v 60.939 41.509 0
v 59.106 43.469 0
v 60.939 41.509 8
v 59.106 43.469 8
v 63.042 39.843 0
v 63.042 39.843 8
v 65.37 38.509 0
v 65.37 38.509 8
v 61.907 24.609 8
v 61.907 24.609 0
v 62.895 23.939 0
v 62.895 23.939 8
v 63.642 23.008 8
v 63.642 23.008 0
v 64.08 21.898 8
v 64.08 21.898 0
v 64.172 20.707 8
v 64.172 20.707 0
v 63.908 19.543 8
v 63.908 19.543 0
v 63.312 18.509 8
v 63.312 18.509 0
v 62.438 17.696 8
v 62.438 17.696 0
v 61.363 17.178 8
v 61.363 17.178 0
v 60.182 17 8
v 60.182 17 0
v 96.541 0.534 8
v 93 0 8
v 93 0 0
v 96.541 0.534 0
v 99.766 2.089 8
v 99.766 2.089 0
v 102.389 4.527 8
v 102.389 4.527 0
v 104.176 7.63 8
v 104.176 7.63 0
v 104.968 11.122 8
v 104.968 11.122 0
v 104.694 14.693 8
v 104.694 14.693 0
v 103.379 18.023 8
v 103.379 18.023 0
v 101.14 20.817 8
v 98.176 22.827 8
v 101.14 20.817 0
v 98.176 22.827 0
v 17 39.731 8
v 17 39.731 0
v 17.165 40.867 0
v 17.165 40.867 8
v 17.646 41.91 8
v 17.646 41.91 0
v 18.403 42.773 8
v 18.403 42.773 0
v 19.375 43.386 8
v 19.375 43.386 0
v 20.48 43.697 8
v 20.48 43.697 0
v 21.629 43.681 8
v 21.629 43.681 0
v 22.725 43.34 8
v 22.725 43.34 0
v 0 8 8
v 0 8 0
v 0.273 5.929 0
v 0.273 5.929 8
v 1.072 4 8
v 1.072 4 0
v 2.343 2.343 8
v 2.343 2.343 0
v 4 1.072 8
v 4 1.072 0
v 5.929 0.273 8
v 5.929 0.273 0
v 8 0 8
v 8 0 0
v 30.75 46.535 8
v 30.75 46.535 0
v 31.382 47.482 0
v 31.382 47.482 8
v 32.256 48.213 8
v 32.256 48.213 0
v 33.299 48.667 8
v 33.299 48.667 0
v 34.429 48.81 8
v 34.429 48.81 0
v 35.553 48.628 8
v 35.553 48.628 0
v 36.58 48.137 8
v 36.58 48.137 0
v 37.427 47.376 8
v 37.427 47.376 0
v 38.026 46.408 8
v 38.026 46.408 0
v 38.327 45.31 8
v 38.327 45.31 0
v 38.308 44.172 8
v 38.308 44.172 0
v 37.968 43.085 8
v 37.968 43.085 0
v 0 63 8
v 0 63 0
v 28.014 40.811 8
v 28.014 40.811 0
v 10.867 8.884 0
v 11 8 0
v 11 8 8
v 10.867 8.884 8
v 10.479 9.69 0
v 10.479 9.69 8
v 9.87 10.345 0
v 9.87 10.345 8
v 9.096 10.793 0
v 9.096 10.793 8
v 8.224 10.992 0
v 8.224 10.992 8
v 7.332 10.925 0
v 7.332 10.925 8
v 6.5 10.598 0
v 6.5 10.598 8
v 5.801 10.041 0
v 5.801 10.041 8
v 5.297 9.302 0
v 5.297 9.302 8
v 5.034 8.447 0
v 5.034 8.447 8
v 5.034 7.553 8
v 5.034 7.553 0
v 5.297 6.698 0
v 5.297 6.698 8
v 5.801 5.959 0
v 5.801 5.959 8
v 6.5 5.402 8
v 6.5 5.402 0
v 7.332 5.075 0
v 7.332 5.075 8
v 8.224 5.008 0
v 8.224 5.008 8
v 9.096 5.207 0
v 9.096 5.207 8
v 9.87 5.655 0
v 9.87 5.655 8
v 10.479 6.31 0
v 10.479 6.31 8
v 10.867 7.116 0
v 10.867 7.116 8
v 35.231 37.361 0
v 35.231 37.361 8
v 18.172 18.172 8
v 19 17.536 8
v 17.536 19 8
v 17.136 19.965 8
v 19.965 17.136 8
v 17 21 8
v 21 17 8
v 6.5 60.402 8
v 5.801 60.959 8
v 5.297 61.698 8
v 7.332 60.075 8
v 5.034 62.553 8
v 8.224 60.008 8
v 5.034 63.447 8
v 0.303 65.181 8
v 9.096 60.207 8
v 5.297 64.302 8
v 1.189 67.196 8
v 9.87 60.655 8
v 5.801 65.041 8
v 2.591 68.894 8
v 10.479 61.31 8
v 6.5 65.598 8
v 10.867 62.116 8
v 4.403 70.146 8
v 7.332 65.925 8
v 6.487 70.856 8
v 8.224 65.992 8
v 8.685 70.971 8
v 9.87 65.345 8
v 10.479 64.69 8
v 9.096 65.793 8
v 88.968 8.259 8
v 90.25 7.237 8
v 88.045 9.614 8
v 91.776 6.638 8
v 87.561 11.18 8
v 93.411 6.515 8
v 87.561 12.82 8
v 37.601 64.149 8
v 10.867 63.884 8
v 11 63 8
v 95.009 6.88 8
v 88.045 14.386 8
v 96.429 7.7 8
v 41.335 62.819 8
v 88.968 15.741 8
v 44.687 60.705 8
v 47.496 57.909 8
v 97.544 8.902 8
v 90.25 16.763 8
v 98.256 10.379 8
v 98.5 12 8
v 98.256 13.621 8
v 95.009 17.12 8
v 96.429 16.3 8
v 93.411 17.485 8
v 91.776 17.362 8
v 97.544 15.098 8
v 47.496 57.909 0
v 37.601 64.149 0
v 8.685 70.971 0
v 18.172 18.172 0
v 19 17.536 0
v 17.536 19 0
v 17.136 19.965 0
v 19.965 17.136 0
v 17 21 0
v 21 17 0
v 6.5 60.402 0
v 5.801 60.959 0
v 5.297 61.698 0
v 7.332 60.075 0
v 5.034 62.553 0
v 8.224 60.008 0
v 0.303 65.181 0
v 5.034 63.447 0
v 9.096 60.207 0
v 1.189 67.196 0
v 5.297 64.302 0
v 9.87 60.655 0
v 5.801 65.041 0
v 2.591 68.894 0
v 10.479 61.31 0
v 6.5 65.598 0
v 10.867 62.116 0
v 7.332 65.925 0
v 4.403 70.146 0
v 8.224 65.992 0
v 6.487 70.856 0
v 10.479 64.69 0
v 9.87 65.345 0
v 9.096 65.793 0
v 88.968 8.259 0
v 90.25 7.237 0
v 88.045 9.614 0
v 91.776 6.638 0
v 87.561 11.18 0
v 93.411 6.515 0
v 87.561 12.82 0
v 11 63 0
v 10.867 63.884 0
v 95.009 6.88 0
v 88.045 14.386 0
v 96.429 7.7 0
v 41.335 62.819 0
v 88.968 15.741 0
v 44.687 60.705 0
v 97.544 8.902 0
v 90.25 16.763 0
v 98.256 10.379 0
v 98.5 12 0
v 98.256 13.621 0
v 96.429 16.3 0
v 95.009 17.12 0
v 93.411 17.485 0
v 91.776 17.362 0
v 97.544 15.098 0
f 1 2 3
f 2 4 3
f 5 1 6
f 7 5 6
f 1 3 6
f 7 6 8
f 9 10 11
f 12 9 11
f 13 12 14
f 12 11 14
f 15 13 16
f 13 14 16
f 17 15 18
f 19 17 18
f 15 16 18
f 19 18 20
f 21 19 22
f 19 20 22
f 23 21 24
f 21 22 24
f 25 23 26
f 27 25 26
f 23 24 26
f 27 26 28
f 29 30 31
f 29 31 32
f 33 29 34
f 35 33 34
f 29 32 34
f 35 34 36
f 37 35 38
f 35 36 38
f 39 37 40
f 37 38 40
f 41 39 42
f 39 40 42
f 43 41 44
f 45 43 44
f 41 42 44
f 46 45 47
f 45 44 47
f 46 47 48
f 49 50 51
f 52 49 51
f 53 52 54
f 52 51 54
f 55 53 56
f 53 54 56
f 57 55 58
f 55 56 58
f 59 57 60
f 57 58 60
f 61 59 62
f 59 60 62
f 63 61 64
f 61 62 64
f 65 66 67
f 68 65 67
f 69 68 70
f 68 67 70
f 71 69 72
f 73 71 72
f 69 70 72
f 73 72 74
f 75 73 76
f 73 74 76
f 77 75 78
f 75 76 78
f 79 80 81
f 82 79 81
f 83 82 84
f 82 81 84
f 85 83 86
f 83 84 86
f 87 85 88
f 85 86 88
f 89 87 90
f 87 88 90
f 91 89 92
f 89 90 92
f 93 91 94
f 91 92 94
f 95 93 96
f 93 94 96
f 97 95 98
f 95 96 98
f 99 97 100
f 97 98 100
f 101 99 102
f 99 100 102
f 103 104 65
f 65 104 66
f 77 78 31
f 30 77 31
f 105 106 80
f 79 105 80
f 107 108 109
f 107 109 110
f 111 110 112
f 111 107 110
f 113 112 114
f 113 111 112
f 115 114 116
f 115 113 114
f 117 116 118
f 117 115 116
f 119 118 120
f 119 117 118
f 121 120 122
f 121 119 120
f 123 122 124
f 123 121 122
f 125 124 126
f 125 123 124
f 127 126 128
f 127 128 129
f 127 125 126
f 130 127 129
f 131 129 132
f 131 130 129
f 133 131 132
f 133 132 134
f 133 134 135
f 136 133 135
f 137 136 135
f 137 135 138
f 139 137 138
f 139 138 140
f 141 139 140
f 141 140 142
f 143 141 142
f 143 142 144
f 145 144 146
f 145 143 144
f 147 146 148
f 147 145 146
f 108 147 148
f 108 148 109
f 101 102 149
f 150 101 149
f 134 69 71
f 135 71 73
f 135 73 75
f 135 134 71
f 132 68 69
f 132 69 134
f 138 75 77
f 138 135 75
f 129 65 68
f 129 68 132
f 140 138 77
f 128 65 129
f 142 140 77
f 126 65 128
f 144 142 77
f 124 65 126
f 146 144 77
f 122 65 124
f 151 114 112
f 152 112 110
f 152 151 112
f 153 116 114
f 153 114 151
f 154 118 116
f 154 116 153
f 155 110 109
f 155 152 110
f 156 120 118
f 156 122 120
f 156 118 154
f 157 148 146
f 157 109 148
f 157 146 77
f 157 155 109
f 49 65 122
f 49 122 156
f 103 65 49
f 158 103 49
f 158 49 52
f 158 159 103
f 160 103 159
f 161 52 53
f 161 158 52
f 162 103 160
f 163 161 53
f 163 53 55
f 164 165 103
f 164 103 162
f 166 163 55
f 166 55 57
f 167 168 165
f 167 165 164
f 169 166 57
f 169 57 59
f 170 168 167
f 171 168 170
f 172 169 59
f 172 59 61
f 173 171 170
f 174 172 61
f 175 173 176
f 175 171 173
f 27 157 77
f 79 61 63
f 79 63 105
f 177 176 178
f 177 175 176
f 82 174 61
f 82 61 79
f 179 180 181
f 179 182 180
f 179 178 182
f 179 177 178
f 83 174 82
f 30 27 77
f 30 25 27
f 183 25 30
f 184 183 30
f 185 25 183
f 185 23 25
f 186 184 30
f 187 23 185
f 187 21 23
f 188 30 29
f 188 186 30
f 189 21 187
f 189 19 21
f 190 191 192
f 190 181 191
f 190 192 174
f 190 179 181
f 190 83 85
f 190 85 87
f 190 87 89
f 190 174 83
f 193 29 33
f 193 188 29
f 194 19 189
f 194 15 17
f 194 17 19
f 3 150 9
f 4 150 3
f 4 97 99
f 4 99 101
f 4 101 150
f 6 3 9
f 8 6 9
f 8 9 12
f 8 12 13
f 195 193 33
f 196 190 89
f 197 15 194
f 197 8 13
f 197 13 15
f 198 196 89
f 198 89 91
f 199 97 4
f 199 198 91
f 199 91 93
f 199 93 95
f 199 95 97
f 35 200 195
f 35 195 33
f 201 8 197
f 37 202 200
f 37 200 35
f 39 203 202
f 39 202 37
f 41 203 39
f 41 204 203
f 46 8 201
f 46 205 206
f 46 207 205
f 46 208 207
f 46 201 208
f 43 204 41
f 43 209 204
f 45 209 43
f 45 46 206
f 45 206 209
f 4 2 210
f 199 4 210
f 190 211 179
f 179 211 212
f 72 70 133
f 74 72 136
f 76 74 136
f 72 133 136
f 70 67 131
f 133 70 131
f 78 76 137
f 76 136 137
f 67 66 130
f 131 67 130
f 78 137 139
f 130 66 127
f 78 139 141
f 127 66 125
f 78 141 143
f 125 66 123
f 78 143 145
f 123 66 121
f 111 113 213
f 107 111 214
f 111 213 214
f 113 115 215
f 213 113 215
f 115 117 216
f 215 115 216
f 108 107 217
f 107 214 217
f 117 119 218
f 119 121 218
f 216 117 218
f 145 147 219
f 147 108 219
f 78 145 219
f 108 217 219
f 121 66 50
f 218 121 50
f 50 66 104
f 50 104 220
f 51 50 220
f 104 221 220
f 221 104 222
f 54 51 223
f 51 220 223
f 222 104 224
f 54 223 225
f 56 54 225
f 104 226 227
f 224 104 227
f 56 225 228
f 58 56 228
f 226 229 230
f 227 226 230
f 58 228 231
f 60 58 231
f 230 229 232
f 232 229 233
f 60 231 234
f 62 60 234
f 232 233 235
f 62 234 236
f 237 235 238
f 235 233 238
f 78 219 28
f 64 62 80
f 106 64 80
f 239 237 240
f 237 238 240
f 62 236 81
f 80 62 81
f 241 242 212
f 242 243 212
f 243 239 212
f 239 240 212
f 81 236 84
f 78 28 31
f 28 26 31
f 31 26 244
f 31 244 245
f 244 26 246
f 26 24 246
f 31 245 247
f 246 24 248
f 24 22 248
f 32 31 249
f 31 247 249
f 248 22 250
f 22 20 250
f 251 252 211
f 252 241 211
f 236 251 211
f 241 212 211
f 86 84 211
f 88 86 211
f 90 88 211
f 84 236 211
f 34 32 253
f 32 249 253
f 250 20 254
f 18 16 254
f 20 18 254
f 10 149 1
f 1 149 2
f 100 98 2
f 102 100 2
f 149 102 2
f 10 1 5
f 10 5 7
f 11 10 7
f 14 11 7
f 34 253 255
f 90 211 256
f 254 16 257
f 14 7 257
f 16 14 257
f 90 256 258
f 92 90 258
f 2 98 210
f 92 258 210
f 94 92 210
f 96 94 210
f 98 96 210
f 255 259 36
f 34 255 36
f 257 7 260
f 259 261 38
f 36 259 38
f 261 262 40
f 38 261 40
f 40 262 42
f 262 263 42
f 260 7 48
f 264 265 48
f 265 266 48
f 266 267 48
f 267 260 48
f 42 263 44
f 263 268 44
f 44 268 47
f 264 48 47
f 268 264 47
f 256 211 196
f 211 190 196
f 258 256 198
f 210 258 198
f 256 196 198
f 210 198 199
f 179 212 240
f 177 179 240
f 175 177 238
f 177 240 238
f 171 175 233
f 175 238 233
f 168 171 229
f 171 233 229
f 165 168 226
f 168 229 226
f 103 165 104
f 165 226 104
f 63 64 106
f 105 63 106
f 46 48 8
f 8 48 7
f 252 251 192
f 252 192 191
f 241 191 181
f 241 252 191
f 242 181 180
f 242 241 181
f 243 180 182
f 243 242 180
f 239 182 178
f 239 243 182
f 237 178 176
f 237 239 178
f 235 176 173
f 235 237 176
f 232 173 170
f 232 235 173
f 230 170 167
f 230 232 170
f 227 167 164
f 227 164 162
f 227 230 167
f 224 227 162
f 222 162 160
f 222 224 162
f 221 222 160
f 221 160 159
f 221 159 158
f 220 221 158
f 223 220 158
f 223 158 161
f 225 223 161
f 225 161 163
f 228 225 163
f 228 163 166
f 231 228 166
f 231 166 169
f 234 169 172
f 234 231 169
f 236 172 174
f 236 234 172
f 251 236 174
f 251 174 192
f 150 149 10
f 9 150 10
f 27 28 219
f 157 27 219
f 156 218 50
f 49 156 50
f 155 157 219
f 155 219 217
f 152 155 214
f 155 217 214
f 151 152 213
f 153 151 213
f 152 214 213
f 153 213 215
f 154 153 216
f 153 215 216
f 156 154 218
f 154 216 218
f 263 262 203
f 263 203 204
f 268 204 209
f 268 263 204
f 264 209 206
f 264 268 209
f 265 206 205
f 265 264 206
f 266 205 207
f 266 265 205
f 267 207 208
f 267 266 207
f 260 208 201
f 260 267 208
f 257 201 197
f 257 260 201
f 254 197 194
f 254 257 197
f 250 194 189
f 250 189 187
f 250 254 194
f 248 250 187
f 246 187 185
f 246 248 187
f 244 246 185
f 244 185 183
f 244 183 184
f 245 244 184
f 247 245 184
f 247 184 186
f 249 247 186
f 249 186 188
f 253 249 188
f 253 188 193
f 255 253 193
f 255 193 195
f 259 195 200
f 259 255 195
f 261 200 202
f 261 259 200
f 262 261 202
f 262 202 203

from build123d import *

# Parameters (mm, degrees)
F0_R     = 3
F0_R_2   = 5.5
F1_DEPTH = 8
F2_R     = 18


with BuildPart() as f1:
    # F0 (on Top) → F1 (new body)
    with BuildSketch(Plane.XY):
        with BuildLine():
            ThreePointArc((8.685422, 70.970583), (2.590905, 68.894208), (0, 63))
            Line((0, 63), (0, 8))
            ThreePointArc((0, 8), (2.343146, 2.343146), (8, 0))
            Line((8, 0), (93, 0))
            ThreePointArc((93, 0), (104.702957, 9.346551), (98.175532, 22.826535))
            Line((98.175532, 22.826535), (61.6736, 40.275971))
            Line((61.6736, 40.275971), (43.620393, 62.728427))
            Line((43.620393, 62.728427), (8.685422, 70.970583))
        make_face()
        with Locations((8, 8)):
            Circle(F0_R, mode=Mode.SUBTRACT)
        with BuildLine():
            Line((17, 21), (17, 39.730763))
            ThreePointArc((17, 39.730763), (18.86701, 43.1146), (22.725177, 43.339608))
            Line((22.725177, 43.339608), (28.013733, 40.811459))
            Line((28.013733, 40.811459), (30.749989, 46.535348))
            ThreePointArc((30.749989, 46.535348), (36.084011, 48.419016), (37.967679, 43.084993))
            Line((37.967679, 43.084993), (35.231423, 37.361104))
            Line((35.231423, 37.361104), (61.907477, 24.608845))
            ThreePointArc((61.907477, 24.608845), (64.083285, 20.115517), (60.182299, 17))
            Line((60.182299, 17), (21, 17))
            ThreePointArc((21, 17), (18.171573, 18.171573), (17, 21))
        make_face(mode=Mode.SUBTRACT)
        with Locations((93, 12)):
            Circle(F0_R_2, mode=Mode.SUBTRACT)
        with Locations((8, 63)):
            Circle(F0_R, mode=Mode.SUBTRACT)
    extrude(amount=F1_DEPTH)

    # F2
    f2_edges = [f1.edges().sort_by_distance(p)[0] for p in [
        (43.620393, 62.728427, 4),
        (61.6736, 40.275971, 4),
    ]]
    fillet(f2_edges, radius=F2_R)


solid = f1.part
